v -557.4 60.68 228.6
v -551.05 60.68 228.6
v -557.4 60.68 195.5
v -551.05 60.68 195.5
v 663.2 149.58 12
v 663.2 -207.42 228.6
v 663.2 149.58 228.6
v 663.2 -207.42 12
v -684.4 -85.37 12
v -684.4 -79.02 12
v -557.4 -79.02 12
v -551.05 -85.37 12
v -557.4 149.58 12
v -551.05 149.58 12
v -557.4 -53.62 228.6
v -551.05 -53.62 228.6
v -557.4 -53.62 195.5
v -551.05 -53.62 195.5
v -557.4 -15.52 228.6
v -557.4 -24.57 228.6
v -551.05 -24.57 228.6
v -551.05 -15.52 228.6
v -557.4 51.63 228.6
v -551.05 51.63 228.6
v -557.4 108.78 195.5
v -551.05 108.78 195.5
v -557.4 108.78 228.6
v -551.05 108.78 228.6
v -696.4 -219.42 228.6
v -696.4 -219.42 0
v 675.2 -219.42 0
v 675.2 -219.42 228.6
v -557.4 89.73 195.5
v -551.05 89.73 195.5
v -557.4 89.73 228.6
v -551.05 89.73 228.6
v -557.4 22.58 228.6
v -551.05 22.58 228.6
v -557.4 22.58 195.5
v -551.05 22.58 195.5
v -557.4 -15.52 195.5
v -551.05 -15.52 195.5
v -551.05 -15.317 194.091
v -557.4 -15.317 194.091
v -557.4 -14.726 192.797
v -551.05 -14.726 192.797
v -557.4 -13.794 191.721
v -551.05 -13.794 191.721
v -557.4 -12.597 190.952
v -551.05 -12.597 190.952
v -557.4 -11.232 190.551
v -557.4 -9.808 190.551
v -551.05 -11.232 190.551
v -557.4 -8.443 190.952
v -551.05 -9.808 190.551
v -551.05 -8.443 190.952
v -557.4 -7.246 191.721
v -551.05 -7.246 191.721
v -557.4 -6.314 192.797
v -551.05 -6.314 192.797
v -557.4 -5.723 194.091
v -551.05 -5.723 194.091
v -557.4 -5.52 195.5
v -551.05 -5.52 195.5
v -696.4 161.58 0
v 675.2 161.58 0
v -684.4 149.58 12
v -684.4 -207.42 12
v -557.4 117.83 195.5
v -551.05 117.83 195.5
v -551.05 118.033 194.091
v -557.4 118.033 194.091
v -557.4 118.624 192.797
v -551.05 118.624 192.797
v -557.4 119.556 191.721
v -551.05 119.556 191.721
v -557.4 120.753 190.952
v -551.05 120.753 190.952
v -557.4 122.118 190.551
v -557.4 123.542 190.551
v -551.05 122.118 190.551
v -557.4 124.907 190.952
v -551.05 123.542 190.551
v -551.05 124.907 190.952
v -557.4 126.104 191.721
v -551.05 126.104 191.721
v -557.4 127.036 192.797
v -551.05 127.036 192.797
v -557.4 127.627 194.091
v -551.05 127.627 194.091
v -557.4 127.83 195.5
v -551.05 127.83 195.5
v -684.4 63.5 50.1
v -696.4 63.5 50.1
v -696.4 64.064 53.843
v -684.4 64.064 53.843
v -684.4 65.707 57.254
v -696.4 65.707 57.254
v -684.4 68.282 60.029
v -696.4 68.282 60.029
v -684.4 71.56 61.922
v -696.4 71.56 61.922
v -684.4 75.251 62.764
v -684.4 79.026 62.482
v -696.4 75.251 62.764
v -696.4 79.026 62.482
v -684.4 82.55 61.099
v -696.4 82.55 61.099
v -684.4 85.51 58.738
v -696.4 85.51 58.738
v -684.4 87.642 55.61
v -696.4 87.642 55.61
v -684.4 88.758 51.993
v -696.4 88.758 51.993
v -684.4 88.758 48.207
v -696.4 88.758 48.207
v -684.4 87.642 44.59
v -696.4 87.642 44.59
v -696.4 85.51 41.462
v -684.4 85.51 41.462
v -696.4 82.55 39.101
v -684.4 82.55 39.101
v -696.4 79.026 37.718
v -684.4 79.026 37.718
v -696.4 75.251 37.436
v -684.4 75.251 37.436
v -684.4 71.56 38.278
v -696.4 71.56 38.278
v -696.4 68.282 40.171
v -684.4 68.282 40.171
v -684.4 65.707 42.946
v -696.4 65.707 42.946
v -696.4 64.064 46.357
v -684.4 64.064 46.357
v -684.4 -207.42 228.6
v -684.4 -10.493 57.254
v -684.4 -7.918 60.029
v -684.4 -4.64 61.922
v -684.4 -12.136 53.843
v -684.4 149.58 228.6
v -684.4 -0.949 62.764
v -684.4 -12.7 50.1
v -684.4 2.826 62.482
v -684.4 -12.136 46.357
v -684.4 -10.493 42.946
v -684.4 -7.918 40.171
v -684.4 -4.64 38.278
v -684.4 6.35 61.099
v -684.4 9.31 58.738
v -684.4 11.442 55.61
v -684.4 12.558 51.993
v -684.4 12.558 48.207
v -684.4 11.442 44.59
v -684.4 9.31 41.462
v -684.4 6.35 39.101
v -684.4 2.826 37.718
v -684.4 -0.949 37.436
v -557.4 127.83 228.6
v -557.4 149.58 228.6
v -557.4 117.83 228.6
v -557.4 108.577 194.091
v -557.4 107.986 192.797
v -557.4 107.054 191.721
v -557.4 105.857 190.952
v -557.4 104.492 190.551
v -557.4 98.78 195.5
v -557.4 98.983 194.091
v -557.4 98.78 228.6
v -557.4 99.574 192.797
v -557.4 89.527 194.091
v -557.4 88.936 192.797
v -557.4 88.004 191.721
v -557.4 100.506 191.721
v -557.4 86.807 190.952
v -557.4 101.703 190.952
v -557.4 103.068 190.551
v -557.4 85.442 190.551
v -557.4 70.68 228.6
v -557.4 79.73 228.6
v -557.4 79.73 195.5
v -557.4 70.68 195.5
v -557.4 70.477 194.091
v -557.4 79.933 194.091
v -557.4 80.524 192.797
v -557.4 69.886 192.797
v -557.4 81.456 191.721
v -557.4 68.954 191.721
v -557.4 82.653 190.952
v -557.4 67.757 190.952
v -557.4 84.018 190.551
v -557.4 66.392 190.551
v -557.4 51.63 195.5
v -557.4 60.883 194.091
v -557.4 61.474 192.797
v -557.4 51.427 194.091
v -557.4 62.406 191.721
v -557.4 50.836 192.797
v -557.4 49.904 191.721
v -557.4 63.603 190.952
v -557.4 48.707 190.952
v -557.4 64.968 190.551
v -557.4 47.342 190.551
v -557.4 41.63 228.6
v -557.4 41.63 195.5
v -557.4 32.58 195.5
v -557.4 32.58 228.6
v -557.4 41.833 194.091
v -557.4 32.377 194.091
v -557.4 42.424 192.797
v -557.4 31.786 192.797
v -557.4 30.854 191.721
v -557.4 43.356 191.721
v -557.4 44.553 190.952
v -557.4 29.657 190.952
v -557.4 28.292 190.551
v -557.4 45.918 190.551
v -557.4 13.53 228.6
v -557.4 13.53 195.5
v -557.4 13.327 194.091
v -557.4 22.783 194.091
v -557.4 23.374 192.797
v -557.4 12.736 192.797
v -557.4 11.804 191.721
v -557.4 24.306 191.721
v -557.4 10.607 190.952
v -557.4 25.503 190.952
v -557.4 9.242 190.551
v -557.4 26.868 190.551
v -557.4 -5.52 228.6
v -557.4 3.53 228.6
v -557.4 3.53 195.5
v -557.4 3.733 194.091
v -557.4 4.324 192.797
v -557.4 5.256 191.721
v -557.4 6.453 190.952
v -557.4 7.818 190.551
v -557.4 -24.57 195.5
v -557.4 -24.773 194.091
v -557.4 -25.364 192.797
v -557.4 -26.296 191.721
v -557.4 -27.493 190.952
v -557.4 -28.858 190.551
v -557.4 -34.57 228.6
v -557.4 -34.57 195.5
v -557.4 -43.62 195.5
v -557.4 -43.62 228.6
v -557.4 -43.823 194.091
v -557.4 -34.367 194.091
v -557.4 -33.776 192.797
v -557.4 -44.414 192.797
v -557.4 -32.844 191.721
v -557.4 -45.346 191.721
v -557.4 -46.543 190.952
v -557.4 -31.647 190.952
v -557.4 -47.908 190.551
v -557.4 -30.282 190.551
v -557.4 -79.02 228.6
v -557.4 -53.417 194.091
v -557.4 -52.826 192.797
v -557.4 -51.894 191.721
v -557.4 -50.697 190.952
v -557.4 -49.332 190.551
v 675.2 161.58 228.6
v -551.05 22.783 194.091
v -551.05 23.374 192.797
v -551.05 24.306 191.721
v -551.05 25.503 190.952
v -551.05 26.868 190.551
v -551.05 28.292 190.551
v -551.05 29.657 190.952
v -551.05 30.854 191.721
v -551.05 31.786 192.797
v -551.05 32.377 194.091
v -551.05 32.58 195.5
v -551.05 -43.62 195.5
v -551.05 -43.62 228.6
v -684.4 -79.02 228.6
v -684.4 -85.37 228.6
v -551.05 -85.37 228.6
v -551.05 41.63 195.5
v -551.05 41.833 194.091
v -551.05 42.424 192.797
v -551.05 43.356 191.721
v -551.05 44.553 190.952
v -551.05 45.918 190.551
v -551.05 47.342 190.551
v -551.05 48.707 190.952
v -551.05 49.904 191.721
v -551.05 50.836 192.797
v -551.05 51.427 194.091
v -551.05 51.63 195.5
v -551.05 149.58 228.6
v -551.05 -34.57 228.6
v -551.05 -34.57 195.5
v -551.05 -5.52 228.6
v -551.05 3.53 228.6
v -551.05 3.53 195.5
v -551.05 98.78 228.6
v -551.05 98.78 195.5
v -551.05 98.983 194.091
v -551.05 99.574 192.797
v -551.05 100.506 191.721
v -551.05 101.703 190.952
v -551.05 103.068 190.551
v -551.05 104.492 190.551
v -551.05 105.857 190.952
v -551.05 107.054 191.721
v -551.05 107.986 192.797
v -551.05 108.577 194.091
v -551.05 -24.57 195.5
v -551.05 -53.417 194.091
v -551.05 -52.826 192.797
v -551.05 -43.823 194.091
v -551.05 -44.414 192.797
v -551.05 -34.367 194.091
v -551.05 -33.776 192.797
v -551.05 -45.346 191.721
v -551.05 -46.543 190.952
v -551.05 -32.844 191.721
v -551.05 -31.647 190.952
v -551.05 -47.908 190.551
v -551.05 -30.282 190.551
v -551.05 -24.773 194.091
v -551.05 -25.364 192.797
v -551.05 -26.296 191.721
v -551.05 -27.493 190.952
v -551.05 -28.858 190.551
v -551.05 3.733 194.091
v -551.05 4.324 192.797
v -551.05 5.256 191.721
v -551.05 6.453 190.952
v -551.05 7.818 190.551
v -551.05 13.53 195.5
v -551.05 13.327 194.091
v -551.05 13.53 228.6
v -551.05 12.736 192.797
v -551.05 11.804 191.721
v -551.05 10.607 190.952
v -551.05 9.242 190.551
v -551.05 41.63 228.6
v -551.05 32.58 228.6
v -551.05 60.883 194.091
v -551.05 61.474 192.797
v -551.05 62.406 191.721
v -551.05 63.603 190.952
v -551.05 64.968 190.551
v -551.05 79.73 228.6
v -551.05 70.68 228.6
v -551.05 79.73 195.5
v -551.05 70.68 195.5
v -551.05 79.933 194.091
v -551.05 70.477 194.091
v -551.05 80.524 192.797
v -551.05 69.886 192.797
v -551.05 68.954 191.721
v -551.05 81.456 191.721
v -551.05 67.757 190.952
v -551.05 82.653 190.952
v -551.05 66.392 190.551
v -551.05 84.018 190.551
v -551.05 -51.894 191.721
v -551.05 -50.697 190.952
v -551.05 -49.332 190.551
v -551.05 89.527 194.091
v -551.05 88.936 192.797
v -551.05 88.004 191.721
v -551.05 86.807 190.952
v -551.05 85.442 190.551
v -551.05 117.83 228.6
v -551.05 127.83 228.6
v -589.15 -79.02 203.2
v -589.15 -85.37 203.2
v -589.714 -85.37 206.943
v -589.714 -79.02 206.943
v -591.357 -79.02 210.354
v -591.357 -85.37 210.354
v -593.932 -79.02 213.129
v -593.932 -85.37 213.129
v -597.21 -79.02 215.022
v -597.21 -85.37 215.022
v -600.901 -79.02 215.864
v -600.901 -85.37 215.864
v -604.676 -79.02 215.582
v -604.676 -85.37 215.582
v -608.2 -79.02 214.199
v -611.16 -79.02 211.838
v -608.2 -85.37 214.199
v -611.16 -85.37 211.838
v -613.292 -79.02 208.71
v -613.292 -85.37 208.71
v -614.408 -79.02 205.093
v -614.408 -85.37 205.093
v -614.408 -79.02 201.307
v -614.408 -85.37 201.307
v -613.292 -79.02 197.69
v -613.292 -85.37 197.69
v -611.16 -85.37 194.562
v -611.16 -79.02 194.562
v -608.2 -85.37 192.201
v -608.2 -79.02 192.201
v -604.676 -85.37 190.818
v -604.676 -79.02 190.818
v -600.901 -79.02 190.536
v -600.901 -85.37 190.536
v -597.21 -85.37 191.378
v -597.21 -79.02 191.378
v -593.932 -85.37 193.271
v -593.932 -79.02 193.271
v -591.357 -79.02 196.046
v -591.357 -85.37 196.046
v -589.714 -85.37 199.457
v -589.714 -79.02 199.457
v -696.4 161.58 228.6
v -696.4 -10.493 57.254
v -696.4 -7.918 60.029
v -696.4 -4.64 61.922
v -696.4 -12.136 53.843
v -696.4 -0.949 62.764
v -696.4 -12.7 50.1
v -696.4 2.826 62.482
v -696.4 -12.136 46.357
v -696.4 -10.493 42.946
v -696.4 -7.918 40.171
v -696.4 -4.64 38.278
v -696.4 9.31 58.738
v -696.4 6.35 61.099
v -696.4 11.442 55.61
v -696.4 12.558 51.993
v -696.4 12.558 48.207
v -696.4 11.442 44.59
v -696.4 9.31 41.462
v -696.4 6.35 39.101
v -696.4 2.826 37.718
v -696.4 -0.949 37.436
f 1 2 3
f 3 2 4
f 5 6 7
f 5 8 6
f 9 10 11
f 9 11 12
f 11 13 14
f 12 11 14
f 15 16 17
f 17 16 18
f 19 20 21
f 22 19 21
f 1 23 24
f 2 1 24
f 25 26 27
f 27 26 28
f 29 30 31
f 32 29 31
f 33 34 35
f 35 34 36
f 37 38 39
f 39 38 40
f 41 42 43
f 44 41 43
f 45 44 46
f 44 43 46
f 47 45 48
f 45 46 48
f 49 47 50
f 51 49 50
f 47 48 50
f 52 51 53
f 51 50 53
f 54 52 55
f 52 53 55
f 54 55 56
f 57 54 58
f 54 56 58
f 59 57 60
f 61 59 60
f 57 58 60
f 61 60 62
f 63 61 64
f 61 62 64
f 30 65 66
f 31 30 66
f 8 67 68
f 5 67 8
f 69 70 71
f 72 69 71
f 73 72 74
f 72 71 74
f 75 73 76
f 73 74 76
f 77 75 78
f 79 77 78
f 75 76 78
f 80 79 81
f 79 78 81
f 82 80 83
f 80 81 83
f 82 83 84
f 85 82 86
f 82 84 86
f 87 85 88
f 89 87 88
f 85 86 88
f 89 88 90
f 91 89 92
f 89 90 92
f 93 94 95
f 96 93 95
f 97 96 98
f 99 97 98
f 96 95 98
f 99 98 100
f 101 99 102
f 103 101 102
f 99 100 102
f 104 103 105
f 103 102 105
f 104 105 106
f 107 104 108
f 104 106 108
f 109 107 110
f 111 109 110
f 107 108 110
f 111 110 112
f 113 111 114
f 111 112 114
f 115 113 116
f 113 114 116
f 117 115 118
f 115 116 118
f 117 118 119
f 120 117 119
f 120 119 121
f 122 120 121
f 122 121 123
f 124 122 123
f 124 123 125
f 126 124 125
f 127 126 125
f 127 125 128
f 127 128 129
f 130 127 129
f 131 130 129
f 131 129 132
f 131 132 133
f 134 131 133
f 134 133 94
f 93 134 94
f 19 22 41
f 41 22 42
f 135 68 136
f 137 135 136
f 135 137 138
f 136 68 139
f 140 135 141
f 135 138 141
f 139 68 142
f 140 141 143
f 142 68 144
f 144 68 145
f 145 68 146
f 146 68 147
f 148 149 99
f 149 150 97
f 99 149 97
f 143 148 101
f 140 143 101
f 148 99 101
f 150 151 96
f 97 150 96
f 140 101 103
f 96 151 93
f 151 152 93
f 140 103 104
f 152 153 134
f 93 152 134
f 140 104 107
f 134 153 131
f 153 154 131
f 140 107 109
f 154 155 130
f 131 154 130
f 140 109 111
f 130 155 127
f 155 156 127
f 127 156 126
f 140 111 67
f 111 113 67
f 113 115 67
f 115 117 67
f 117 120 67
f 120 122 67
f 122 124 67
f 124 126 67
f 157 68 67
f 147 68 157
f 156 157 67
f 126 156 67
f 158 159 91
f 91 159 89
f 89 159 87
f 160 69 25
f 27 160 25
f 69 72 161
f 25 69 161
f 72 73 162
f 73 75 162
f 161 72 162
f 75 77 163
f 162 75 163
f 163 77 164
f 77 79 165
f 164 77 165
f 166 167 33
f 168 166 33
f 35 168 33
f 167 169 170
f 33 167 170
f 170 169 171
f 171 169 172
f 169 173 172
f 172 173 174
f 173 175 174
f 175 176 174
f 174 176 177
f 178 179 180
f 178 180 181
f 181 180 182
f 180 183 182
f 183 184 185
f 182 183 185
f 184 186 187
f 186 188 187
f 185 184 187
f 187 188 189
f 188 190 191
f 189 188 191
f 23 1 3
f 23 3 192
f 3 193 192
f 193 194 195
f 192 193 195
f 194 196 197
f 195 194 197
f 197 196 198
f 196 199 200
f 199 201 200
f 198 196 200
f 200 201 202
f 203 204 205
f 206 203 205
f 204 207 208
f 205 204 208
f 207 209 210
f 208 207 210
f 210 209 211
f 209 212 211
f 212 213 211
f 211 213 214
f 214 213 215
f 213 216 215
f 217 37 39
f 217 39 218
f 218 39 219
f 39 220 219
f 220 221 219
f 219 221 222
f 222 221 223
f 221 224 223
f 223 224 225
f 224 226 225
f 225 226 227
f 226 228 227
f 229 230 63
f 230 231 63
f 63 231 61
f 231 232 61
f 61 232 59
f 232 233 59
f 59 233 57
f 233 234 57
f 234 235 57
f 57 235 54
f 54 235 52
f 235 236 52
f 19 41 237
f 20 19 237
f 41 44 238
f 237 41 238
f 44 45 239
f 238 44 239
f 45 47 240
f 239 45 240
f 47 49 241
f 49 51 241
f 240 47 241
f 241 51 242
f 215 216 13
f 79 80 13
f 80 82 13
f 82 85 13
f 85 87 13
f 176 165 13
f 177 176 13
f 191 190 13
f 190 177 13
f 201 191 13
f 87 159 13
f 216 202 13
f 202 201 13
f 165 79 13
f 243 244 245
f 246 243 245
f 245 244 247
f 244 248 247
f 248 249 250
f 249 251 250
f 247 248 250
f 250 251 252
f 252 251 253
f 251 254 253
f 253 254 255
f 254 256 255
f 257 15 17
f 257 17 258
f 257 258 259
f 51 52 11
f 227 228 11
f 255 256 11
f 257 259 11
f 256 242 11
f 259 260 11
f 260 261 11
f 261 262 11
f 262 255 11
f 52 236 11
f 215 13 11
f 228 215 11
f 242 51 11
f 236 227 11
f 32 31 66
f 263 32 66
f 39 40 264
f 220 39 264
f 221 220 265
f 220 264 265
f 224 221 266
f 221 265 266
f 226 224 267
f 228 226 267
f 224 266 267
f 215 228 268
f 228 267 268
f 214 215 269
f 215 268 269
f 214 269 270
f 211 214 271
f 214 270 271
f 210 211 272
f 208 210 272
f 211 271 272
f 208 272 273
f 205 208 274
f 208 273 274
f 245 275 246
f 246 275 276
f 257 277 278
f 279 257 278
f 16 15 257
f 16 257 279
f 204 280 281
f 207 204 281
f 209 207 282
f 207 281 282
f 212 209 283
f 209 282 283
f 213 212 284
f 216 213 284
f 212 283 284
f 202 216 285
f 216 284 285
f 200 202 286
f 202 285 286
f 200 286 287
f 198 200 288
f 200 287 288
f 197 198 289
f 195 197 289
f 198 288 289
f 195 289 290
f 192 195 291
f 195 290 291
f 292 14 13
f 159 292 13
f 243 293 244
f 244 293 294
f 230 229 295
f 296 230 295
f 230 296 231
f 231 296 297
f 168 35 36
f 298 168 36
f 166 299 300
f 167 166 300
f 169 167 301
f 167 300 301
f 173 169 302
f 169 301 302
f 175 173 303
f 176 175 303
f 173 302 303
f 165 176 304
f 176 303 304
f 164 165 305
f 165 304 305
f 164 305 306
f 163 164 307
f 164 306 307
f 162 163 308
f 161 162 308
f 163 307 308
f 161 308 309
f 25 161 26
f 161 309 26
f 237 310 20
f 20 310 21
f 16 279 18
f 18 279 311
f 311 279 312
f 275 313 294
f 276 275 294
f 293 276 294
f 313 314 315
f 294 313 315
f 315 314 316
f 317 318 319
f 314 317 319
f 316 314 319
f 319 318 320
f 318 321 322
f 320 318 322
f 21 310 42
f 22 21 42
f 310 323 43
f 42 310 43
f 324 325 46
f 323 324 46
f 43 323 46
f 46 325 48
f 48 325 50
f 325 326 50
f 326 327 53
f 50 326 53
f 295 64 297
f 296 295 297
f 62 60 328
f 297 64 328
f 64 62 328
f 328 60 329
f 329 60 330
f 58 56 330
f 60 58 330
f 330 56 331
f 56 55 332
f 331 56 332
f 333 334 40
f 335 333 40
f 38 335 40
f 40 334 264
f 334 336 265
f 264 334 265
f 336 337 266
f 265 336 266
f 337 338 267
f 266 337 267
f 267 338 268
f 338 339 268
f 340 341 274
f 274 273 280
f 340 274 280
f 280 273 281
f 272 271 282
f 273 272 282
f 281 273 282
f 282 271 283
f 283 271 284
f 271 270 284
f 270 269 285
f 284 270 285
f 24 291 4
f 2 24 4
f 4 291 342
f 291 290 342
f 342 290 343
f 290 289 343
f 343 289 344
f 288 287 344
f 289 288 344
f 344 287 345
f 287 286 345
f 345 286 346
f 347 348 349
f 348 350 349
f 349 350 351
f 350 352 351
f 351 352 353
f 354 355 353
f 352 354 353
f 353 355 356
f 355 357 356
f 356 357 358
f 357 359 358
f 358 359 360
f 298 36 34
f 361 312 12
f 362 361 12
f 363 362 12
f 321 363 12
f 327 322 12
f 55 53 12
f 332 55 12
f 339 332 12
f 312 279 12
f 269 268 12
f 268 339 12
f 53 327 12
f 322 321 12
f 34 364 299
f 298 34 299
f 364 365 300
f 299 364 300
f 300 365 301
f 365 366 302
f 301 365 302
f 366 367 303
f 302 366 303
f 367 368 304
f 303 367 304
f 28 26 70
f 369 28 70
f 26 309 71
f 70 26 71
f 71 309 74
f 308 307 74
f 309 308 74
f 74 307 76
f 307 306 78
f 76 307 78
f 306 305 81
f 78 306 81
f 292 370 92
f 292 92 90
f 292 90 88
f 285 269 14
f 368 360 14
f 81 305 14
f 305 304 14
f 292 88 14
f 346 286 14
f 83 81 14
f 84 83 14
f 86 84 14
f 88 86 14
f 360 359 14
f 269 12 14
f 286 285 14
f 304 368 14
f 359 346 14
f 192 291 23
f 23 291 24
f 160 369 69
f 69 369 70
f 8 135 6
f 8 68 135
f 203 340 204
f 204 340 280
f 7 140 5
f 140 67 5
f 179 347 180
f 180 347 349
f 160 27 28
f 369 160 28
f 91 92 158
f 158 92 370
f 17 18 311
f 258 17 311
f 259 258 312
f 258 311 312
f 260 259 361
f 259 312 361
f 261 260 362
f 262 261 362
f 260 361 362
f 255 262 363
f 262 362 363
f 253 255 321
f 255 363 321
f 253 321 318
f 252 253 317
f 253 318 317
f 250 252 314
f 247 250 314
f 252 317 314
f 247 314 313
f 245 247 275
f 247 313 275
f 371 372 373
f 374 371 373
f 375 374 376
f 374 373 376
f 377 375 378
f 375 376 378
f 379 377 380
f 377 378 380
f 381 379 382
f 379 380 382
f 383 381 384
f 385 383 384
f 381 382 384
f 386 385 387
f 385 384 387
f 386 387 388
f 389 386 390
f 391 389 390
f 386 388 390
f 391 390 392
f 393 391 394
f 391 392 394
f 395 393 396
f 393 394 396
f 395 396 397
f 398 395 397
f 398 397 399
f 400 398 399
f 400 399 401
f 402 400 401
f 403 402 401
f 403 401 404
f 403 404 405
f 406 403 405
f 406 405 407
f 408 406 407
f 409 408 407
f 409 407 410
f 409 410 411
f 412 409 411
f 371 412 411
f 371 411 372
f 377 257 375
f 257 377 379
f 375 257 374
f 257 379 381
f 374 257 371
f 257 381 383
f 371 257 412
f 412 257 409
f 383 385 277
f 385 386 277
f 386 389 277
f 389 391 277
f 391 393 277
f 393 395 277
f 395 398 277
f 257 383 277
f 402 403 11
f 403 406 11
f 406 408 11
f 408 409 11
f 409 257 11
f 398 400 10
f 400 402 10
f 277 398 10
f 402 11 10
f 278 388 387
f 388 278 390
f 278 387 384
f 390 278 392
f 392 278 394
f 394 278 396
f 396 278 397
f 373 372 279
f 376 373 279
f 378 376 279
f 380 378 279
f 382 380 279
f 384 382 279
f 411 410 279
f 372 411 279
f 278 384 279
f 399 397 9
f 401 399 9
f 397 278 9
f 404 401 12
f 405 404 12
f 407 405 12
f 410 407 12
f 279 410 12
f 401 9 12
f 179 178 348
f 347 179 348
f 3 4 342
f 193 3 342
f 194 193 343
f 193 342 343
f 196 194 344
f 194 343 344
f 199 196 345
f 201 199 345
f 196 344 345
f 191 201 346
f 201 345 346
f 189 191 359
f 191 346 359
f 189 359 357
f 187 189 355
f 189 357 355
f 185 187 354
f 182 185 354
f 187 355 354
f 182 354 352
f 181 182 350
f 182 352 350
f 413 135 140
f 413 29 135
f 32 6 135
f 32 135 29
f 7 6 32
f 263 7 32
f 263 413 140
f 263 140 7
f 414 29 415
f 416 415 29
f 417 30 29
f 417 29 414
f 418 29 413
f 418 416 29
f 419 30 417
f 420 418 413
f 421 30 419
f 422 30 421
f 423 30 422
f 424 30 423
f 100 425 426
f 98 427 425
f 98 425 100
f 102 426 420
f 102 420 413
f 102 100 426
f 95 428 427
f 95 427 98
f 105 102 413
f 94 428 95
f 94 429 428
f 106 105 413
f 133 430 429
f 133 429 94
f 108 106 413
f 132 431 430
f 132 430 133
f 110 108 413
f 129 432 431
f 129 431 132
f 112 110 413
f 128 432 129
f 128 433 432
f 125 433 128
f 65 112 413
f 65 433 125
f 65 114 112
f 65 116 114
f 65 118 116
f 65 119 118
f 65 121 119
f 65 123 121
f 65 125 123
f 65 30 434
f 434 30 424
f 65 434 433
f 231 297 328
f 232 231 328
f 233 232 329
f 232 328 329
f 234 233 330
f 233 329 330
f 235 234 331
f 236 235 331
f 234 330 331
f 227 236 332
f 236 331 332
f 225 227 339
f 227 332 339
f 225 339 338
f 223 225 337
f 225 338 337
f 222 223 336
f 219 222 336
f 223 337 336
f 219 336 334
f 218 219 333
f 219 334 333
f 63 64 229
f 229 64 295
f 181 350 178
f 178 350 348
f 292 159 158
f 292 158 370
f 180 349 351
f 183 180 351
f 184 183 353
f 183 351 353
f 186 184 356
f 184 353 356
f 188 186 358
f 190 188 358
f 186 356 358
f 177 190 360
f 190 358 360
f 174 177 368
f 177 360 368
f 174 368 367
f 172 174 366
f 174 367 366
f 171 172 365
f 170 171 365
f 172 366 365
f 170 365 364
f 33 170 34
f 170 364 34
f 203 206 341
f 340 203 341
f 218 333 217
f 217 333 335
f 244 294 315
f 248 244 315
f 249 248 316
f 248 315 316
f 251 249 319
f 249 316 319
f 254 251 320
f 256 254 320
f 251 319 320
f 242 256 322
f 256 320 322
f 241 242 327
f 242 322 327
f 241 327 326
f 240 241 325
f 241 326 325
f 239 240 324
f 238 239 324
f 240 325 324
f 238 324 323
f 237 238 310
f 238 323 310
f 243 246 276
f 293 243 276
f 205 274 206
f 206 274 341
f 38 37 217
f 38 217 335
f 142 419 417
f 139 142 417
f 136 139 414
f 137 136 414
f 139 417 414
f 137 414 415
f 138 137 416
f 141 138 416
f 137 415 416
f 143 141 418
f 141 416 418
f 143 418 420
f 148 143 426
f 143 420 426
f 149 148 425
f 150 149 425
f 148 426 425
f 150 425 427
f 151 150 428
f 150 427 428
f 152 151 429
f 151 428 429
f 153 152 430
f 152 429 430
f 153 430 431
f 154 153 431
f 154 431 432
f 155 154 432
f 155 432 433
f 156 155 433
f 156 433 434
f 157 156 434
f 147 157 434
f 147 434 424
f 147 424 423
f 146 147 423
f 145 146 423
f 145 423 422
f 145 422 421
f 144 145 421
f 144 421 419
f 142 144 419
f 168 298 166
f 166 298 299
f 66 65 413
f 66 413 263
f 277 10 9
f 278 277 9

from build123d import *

# Parameters (mm, degrees)
F0_W      = 1371.6
F0_H      = 381
F1_DEPTH  = 228.6
F2_T      = -12
F4_DEPTH  = 216.6
F5_R      = 12.7
F6_DEPTH  = 25.4
F8_DEPTH  = 25.4
F9_R      = 12.7
F10_DEPTH = 25.4


with BuildPart() as f1:
    # F0 (on Top) → F1 (new body)
    with BuildSketch(Plane.XY):
        with Locations((-10.599822, -28.919976)):
            Rectangle(F0_W, F0_H)
    extrude(amount=F1_DEPTH)

    # F2
    f2_openings = [f1.faces().sort_by_distance(p)[0] for p in [
        (-10.599822, -28.919976, 228.6),
    ]]
    offset(amount=F2_T, openings=f2_openings)

    # F9 (on face) → F10 (cut)
    with BuildSketch(Plane(origin=(-696.399822, 0, 0), x_dir=(0, -1, 0), z_dir=(-1, 0, 0))):
        with Locations((-76.2, 50.1)):
            Circle(F9_R)
        with Locations((0, 50.1)):
            Circle(F9_R)
    extrude(amount=-F10_DEPTH, mode=Mode.SUBTRACT)


with BuildPart() as f4:
    # F3 (on face) → F4 (new body)
    with BuildSketch(Plane.XY.offset(12)):
        Polygon((-551.049822, 149.580024), (-557.399822, 149.580024), (-557.399822, -79.019976), (-684.399822, -79.019976), (-684.399822, -85.369976), (-551.049822, -85.369976), align=None)
    extrude(amount=F4_DEPTH)

    # F5 (on face) → F6 (cut)
    with BuildSketch(Plane.XZ.offset(85.369976)):
        with Locations((-601.849822, 203.2)):
            Circle(F5_R)
    extrude(amount=-F6_DEPTH, mode=Mode.SUBTRACT)

    # F7 (on face) → F8 (cut)
    with BuildSketch(Plane.YZ.offset(-551.049822)):
        with BuildLine():
            Line((-43.619976, 228.6), (-53.619976, 228.6))
            Line((-53.619976, 228.6), (-53.619976, 195.5))
            ThreePointArc((-53.619976, 195.5), (-48.619976, 190.5), (-43.619976, 195.5))
            Line((-43.619976, 195.5), (-43.619976, 228.6))
        make_face()
        with BuildLine():
            Line((-24.569976, 228.6), (-34.569976, 228.6))
            Line((-34.569976, 228.6), (-34.569976, 195.5))
            ThreePointArc((-34.569976, 195.5), (-29.569976, 190.5), (-24.569976, 195.5))
            Line((-24.569976, 195.5), (-24.569976, 228.6))
        make_face()
        with BuildLine():
            Line((-5.519976, 228.6), (-15.519976, 228.6))
            Line((-15.519976, 228.6), (-15.519976, 195.5))
            ThreePointArc((-15.519976, 195.5), (-10.519976, 190.5), (-5.519976, 195.5))
            Line((-5.519976, 195.5), (-5.519976, 228.6))
        make_face()
        with BuildLine():
            Line((13.530024, 228.6), (3.530024, 228.6))
            Line((3.530024, 228.6), (3.530024, 195.5))
            ThreePointArc((3.530024, 195.5), (8.530024, 190.5), (13.530024, 195.5))
            Line((13.530024, 195.5), (13.530024, 228.6))
        make_face()
        with BuildLine():
            Line((32.580024, 228.6), (22.580024, 228.6))
            Line((22.580024, 228.6), (22.580024, 195.5))
            ThreePointArc((22.580024, 195.5), (27.580024, 190.5), (32.580024, 195.5))
            Line((32.580024, 195.5), (32.580024, 228.6))
        make_face()
        with BuildLine():
            Line((51.630024, 228.6), (41.630024, 228.6))
            Line((41.630024, 228.6), (41.630024, 195.5))
            ThreePointArc((41.630024, 195.5), (46.630024, 190.5), (51.630024, 195.5))
            Line((51.630024, 195.5), (51.630024, 228.6))
        make_face()
        with BuildLine():
            Line((70.680024, 228.6), (60.680024, 228.6))
            Line((60.680024, 228.6), (60.680024, 195.5))
            ThreePointArc((60.680024, 195.5), (65.680024, 190.5), (70.680024, 195.5))
            Line((70.680024, 195.5), (70.680024, 228.6))
        make_face()
        with BuildLine():
            Line((89.730024, 228.6), (79.730024, 228.6))
            Line((79.730024, 228.6), (79.730024, 195.5))
            ThreePointArc((79.730024, 195.5), (84.730024, 190.5), (89.730024, 195.5))
            Line((89.730024, 195.5), (89.730024, 228.6))
        make_face()
        with BuildLine():
            Line((108.780024, 228.6), (98.780024, 228.6))
            Line((98.780024, 228.6), (98.780024, 195.5))
            ThreePointArc((98.780024, 195.5), (103.780024, 190.5), (108.780024, 195.5))
            Line((108.780024, 195.5), (108.780024, 228.6))
        make_face()
        with BuildLine():
            Line((127.830024, 228.6), (117.830024, 228.6))
            Line((117.830024, 228.6), (117.830024, 195.5))
            ThreePointArc((117.830024, 195.5), (122.830024, 190.5), (127.830024, 195.5))
            Line((127.830024, 195.5), (127.830024, 228.6))
        make_face()
    extrude(amount=-F8_DEPTH, mode=Mode.SUBTRACT)


solid = Compound([f1.part, f4.part])
